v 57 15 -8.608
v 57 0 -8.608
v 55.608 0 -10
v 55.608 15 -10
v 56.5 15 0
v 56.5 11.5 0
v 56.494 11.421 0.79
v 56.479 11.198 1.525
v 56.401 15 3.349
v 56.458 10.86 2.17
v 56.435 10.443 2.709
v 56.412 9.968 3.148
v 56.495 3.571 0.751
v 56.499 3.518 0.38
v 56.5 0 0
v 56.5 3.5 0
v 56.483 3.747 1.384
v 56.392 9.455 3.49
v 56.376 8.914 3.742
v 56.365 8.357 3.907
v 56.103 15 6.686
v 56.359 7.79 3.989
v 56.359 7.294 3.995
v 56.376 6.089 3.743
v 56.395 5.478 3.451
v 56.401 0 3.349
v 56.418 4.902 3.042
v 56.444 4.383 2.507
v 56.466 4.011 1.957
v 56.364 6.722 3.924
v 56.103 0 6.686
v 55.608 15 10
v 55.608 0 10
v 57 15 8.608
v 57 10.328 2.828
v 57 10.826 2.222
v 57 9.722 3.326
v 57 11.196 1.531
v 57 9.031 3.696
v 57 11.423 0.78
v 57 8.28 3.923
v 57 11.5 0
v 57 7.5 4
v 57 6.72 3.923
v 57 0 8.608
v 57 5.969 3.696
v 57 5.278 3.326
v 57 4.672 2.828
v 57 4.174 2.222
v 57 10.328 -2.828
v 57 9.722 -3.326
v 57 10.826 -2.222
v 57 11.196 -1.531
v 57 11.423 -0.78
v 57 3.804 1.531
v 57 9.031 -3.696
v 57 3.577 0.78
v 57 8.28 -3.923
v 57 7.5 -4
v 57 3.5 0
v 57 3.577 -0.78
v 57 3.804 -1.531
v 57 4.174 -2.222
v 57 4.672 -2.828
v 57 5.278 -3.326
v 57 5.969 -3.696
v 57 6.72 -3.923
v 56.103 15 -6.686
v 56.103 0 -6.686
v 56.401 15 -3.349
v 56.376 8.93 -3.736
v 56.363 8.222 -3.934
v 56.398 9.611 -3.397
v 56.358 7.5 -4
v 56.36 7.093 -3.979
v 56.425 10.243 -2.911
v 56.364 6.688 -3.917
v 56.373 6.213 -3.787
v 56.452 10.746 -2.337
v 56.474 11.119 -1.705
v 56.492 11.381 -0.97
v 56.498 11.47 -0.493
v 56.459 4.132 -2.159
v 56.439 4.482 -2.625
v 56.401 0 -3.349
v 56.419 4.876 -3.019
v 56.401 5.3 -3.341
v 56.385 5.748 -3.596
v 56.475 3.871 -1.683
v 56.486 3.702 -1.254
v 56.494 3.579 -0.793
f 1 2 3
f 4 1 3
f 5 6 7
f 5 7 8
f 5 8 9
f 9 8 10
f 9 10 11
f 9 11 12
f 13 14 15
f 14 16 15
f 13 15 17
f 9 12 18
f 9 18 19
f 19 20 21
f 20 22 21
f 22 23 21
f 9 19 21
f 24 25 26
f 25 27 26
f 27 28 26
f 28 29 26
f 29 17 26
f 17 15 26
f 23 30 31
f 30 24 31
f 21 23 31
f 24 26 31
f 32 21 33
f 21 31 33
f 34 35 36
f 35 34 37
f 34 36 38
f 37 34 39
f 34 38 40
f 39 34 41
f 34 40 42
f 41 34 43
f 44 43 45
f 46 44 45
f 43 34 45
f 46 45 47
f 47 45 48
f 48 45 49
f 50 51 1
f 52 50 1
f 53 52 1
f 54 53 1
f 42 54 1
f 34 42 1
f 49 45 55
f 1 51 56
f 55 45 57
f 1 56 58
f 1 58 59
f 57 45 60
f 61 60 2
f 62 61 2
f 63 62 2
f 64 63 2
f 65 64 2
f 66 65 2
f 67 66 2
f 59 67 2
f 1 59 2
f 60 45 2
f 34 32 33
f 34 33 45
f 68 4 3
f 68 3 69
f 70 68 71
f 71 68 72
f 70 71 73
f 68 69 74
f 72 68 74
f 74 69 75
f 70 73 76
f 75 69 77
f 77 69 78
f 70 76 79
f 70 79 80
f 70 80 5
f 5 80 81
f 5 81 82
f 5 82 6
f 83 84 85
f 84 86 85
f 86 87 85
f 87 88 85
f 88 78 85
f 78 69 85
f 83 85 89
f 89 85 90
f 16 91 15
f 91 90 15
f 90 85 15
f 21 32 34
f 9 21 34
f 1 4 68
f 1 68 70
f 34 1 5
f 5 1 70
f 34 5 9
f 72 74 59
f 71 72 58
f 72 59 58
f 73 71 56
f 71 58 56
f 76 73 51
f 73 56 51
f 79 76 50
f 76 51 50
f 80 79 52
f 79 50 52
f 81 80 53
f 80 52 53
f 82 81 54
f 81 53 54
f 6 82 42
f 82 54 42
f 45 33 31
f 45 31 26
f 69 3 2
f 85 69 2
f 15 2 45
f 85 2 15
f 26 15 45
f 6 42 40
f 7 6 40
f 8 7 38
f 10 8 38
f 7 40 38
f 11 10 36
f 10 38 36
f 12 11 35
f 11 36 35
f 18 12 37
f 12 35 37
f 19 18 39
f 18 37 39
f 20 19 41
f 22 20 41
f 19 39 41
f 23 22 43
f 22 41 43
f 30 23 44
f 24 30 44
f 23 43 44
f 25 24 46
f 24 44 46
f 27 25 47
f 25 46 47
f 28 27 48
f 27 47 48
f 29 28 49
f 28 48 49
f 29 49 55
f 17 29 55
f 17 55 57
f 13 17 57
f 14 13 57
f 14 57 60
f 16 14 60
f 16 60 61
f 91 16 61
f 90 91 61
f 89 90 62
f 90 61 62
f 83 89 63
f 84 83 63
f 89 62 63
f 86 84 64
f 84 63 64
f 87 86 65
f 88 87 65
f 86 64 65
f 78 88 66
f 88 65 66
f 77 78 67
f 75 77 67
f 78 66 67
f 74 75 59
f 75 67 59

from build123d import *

# Parameters (mm, degrees)
BOSS_EXTRUDE1_DEPTH = 15
CUT_EXTRUDE1_DEPTH  = 25


with BuildPart() as part:
    # Sketch1 → Boss-Extrude1 (new body)
    with BuildSketch(Plane(origin=(0, 0, 0), x_dir=(1, 0, 0), z_dir=(0, 1, 0))):
        with BuildLine():
            ThreePointArc((55.608003021, 10), (56.276558933, 5.019852055), (56.5, 0))
            ThreePointArc((56.5, 0), (56.276558933, -5.019852055), (55.608003021, -10))
            Line((55.608003021, -10), (57, -8.608003021))
            Line((57, -8.608003021), (57, 8.608003021))
            Line((57, 8.608003021), (55.608003021, 10))
        make_face()
    extrude(amount=BOSS_EXTRUDE1_DEPTH)

    # Sketch2 → Cut-Extrude1 (cut)
    with BuildSketch(Plane(origin=(67, 0, 0), x_dir=(0, 0, -1), z_dir=(1, 0, 0))):
        with BuildLine():
            ThreePointArc((0, 11.5), (-4, 7.5), (0, 3.5))
            Line((0, 3.5), (0, 11.5))
        make_face()
        with BuildLine():
            Line((0, 11.5), (0, 3.5))
            ThreePointArc((0, 3.5), (2.828427125, 4.671572875), (4, 7.5))
            ThreePointArc((4, 7.5), (2.828427125, 10.328427125), (0, 11.5))
        make_face()
    extrude(amount=-CUT_EXTRUDE1_DEPTH, mode=Mode.SUBTRACT)


solid = part.part
